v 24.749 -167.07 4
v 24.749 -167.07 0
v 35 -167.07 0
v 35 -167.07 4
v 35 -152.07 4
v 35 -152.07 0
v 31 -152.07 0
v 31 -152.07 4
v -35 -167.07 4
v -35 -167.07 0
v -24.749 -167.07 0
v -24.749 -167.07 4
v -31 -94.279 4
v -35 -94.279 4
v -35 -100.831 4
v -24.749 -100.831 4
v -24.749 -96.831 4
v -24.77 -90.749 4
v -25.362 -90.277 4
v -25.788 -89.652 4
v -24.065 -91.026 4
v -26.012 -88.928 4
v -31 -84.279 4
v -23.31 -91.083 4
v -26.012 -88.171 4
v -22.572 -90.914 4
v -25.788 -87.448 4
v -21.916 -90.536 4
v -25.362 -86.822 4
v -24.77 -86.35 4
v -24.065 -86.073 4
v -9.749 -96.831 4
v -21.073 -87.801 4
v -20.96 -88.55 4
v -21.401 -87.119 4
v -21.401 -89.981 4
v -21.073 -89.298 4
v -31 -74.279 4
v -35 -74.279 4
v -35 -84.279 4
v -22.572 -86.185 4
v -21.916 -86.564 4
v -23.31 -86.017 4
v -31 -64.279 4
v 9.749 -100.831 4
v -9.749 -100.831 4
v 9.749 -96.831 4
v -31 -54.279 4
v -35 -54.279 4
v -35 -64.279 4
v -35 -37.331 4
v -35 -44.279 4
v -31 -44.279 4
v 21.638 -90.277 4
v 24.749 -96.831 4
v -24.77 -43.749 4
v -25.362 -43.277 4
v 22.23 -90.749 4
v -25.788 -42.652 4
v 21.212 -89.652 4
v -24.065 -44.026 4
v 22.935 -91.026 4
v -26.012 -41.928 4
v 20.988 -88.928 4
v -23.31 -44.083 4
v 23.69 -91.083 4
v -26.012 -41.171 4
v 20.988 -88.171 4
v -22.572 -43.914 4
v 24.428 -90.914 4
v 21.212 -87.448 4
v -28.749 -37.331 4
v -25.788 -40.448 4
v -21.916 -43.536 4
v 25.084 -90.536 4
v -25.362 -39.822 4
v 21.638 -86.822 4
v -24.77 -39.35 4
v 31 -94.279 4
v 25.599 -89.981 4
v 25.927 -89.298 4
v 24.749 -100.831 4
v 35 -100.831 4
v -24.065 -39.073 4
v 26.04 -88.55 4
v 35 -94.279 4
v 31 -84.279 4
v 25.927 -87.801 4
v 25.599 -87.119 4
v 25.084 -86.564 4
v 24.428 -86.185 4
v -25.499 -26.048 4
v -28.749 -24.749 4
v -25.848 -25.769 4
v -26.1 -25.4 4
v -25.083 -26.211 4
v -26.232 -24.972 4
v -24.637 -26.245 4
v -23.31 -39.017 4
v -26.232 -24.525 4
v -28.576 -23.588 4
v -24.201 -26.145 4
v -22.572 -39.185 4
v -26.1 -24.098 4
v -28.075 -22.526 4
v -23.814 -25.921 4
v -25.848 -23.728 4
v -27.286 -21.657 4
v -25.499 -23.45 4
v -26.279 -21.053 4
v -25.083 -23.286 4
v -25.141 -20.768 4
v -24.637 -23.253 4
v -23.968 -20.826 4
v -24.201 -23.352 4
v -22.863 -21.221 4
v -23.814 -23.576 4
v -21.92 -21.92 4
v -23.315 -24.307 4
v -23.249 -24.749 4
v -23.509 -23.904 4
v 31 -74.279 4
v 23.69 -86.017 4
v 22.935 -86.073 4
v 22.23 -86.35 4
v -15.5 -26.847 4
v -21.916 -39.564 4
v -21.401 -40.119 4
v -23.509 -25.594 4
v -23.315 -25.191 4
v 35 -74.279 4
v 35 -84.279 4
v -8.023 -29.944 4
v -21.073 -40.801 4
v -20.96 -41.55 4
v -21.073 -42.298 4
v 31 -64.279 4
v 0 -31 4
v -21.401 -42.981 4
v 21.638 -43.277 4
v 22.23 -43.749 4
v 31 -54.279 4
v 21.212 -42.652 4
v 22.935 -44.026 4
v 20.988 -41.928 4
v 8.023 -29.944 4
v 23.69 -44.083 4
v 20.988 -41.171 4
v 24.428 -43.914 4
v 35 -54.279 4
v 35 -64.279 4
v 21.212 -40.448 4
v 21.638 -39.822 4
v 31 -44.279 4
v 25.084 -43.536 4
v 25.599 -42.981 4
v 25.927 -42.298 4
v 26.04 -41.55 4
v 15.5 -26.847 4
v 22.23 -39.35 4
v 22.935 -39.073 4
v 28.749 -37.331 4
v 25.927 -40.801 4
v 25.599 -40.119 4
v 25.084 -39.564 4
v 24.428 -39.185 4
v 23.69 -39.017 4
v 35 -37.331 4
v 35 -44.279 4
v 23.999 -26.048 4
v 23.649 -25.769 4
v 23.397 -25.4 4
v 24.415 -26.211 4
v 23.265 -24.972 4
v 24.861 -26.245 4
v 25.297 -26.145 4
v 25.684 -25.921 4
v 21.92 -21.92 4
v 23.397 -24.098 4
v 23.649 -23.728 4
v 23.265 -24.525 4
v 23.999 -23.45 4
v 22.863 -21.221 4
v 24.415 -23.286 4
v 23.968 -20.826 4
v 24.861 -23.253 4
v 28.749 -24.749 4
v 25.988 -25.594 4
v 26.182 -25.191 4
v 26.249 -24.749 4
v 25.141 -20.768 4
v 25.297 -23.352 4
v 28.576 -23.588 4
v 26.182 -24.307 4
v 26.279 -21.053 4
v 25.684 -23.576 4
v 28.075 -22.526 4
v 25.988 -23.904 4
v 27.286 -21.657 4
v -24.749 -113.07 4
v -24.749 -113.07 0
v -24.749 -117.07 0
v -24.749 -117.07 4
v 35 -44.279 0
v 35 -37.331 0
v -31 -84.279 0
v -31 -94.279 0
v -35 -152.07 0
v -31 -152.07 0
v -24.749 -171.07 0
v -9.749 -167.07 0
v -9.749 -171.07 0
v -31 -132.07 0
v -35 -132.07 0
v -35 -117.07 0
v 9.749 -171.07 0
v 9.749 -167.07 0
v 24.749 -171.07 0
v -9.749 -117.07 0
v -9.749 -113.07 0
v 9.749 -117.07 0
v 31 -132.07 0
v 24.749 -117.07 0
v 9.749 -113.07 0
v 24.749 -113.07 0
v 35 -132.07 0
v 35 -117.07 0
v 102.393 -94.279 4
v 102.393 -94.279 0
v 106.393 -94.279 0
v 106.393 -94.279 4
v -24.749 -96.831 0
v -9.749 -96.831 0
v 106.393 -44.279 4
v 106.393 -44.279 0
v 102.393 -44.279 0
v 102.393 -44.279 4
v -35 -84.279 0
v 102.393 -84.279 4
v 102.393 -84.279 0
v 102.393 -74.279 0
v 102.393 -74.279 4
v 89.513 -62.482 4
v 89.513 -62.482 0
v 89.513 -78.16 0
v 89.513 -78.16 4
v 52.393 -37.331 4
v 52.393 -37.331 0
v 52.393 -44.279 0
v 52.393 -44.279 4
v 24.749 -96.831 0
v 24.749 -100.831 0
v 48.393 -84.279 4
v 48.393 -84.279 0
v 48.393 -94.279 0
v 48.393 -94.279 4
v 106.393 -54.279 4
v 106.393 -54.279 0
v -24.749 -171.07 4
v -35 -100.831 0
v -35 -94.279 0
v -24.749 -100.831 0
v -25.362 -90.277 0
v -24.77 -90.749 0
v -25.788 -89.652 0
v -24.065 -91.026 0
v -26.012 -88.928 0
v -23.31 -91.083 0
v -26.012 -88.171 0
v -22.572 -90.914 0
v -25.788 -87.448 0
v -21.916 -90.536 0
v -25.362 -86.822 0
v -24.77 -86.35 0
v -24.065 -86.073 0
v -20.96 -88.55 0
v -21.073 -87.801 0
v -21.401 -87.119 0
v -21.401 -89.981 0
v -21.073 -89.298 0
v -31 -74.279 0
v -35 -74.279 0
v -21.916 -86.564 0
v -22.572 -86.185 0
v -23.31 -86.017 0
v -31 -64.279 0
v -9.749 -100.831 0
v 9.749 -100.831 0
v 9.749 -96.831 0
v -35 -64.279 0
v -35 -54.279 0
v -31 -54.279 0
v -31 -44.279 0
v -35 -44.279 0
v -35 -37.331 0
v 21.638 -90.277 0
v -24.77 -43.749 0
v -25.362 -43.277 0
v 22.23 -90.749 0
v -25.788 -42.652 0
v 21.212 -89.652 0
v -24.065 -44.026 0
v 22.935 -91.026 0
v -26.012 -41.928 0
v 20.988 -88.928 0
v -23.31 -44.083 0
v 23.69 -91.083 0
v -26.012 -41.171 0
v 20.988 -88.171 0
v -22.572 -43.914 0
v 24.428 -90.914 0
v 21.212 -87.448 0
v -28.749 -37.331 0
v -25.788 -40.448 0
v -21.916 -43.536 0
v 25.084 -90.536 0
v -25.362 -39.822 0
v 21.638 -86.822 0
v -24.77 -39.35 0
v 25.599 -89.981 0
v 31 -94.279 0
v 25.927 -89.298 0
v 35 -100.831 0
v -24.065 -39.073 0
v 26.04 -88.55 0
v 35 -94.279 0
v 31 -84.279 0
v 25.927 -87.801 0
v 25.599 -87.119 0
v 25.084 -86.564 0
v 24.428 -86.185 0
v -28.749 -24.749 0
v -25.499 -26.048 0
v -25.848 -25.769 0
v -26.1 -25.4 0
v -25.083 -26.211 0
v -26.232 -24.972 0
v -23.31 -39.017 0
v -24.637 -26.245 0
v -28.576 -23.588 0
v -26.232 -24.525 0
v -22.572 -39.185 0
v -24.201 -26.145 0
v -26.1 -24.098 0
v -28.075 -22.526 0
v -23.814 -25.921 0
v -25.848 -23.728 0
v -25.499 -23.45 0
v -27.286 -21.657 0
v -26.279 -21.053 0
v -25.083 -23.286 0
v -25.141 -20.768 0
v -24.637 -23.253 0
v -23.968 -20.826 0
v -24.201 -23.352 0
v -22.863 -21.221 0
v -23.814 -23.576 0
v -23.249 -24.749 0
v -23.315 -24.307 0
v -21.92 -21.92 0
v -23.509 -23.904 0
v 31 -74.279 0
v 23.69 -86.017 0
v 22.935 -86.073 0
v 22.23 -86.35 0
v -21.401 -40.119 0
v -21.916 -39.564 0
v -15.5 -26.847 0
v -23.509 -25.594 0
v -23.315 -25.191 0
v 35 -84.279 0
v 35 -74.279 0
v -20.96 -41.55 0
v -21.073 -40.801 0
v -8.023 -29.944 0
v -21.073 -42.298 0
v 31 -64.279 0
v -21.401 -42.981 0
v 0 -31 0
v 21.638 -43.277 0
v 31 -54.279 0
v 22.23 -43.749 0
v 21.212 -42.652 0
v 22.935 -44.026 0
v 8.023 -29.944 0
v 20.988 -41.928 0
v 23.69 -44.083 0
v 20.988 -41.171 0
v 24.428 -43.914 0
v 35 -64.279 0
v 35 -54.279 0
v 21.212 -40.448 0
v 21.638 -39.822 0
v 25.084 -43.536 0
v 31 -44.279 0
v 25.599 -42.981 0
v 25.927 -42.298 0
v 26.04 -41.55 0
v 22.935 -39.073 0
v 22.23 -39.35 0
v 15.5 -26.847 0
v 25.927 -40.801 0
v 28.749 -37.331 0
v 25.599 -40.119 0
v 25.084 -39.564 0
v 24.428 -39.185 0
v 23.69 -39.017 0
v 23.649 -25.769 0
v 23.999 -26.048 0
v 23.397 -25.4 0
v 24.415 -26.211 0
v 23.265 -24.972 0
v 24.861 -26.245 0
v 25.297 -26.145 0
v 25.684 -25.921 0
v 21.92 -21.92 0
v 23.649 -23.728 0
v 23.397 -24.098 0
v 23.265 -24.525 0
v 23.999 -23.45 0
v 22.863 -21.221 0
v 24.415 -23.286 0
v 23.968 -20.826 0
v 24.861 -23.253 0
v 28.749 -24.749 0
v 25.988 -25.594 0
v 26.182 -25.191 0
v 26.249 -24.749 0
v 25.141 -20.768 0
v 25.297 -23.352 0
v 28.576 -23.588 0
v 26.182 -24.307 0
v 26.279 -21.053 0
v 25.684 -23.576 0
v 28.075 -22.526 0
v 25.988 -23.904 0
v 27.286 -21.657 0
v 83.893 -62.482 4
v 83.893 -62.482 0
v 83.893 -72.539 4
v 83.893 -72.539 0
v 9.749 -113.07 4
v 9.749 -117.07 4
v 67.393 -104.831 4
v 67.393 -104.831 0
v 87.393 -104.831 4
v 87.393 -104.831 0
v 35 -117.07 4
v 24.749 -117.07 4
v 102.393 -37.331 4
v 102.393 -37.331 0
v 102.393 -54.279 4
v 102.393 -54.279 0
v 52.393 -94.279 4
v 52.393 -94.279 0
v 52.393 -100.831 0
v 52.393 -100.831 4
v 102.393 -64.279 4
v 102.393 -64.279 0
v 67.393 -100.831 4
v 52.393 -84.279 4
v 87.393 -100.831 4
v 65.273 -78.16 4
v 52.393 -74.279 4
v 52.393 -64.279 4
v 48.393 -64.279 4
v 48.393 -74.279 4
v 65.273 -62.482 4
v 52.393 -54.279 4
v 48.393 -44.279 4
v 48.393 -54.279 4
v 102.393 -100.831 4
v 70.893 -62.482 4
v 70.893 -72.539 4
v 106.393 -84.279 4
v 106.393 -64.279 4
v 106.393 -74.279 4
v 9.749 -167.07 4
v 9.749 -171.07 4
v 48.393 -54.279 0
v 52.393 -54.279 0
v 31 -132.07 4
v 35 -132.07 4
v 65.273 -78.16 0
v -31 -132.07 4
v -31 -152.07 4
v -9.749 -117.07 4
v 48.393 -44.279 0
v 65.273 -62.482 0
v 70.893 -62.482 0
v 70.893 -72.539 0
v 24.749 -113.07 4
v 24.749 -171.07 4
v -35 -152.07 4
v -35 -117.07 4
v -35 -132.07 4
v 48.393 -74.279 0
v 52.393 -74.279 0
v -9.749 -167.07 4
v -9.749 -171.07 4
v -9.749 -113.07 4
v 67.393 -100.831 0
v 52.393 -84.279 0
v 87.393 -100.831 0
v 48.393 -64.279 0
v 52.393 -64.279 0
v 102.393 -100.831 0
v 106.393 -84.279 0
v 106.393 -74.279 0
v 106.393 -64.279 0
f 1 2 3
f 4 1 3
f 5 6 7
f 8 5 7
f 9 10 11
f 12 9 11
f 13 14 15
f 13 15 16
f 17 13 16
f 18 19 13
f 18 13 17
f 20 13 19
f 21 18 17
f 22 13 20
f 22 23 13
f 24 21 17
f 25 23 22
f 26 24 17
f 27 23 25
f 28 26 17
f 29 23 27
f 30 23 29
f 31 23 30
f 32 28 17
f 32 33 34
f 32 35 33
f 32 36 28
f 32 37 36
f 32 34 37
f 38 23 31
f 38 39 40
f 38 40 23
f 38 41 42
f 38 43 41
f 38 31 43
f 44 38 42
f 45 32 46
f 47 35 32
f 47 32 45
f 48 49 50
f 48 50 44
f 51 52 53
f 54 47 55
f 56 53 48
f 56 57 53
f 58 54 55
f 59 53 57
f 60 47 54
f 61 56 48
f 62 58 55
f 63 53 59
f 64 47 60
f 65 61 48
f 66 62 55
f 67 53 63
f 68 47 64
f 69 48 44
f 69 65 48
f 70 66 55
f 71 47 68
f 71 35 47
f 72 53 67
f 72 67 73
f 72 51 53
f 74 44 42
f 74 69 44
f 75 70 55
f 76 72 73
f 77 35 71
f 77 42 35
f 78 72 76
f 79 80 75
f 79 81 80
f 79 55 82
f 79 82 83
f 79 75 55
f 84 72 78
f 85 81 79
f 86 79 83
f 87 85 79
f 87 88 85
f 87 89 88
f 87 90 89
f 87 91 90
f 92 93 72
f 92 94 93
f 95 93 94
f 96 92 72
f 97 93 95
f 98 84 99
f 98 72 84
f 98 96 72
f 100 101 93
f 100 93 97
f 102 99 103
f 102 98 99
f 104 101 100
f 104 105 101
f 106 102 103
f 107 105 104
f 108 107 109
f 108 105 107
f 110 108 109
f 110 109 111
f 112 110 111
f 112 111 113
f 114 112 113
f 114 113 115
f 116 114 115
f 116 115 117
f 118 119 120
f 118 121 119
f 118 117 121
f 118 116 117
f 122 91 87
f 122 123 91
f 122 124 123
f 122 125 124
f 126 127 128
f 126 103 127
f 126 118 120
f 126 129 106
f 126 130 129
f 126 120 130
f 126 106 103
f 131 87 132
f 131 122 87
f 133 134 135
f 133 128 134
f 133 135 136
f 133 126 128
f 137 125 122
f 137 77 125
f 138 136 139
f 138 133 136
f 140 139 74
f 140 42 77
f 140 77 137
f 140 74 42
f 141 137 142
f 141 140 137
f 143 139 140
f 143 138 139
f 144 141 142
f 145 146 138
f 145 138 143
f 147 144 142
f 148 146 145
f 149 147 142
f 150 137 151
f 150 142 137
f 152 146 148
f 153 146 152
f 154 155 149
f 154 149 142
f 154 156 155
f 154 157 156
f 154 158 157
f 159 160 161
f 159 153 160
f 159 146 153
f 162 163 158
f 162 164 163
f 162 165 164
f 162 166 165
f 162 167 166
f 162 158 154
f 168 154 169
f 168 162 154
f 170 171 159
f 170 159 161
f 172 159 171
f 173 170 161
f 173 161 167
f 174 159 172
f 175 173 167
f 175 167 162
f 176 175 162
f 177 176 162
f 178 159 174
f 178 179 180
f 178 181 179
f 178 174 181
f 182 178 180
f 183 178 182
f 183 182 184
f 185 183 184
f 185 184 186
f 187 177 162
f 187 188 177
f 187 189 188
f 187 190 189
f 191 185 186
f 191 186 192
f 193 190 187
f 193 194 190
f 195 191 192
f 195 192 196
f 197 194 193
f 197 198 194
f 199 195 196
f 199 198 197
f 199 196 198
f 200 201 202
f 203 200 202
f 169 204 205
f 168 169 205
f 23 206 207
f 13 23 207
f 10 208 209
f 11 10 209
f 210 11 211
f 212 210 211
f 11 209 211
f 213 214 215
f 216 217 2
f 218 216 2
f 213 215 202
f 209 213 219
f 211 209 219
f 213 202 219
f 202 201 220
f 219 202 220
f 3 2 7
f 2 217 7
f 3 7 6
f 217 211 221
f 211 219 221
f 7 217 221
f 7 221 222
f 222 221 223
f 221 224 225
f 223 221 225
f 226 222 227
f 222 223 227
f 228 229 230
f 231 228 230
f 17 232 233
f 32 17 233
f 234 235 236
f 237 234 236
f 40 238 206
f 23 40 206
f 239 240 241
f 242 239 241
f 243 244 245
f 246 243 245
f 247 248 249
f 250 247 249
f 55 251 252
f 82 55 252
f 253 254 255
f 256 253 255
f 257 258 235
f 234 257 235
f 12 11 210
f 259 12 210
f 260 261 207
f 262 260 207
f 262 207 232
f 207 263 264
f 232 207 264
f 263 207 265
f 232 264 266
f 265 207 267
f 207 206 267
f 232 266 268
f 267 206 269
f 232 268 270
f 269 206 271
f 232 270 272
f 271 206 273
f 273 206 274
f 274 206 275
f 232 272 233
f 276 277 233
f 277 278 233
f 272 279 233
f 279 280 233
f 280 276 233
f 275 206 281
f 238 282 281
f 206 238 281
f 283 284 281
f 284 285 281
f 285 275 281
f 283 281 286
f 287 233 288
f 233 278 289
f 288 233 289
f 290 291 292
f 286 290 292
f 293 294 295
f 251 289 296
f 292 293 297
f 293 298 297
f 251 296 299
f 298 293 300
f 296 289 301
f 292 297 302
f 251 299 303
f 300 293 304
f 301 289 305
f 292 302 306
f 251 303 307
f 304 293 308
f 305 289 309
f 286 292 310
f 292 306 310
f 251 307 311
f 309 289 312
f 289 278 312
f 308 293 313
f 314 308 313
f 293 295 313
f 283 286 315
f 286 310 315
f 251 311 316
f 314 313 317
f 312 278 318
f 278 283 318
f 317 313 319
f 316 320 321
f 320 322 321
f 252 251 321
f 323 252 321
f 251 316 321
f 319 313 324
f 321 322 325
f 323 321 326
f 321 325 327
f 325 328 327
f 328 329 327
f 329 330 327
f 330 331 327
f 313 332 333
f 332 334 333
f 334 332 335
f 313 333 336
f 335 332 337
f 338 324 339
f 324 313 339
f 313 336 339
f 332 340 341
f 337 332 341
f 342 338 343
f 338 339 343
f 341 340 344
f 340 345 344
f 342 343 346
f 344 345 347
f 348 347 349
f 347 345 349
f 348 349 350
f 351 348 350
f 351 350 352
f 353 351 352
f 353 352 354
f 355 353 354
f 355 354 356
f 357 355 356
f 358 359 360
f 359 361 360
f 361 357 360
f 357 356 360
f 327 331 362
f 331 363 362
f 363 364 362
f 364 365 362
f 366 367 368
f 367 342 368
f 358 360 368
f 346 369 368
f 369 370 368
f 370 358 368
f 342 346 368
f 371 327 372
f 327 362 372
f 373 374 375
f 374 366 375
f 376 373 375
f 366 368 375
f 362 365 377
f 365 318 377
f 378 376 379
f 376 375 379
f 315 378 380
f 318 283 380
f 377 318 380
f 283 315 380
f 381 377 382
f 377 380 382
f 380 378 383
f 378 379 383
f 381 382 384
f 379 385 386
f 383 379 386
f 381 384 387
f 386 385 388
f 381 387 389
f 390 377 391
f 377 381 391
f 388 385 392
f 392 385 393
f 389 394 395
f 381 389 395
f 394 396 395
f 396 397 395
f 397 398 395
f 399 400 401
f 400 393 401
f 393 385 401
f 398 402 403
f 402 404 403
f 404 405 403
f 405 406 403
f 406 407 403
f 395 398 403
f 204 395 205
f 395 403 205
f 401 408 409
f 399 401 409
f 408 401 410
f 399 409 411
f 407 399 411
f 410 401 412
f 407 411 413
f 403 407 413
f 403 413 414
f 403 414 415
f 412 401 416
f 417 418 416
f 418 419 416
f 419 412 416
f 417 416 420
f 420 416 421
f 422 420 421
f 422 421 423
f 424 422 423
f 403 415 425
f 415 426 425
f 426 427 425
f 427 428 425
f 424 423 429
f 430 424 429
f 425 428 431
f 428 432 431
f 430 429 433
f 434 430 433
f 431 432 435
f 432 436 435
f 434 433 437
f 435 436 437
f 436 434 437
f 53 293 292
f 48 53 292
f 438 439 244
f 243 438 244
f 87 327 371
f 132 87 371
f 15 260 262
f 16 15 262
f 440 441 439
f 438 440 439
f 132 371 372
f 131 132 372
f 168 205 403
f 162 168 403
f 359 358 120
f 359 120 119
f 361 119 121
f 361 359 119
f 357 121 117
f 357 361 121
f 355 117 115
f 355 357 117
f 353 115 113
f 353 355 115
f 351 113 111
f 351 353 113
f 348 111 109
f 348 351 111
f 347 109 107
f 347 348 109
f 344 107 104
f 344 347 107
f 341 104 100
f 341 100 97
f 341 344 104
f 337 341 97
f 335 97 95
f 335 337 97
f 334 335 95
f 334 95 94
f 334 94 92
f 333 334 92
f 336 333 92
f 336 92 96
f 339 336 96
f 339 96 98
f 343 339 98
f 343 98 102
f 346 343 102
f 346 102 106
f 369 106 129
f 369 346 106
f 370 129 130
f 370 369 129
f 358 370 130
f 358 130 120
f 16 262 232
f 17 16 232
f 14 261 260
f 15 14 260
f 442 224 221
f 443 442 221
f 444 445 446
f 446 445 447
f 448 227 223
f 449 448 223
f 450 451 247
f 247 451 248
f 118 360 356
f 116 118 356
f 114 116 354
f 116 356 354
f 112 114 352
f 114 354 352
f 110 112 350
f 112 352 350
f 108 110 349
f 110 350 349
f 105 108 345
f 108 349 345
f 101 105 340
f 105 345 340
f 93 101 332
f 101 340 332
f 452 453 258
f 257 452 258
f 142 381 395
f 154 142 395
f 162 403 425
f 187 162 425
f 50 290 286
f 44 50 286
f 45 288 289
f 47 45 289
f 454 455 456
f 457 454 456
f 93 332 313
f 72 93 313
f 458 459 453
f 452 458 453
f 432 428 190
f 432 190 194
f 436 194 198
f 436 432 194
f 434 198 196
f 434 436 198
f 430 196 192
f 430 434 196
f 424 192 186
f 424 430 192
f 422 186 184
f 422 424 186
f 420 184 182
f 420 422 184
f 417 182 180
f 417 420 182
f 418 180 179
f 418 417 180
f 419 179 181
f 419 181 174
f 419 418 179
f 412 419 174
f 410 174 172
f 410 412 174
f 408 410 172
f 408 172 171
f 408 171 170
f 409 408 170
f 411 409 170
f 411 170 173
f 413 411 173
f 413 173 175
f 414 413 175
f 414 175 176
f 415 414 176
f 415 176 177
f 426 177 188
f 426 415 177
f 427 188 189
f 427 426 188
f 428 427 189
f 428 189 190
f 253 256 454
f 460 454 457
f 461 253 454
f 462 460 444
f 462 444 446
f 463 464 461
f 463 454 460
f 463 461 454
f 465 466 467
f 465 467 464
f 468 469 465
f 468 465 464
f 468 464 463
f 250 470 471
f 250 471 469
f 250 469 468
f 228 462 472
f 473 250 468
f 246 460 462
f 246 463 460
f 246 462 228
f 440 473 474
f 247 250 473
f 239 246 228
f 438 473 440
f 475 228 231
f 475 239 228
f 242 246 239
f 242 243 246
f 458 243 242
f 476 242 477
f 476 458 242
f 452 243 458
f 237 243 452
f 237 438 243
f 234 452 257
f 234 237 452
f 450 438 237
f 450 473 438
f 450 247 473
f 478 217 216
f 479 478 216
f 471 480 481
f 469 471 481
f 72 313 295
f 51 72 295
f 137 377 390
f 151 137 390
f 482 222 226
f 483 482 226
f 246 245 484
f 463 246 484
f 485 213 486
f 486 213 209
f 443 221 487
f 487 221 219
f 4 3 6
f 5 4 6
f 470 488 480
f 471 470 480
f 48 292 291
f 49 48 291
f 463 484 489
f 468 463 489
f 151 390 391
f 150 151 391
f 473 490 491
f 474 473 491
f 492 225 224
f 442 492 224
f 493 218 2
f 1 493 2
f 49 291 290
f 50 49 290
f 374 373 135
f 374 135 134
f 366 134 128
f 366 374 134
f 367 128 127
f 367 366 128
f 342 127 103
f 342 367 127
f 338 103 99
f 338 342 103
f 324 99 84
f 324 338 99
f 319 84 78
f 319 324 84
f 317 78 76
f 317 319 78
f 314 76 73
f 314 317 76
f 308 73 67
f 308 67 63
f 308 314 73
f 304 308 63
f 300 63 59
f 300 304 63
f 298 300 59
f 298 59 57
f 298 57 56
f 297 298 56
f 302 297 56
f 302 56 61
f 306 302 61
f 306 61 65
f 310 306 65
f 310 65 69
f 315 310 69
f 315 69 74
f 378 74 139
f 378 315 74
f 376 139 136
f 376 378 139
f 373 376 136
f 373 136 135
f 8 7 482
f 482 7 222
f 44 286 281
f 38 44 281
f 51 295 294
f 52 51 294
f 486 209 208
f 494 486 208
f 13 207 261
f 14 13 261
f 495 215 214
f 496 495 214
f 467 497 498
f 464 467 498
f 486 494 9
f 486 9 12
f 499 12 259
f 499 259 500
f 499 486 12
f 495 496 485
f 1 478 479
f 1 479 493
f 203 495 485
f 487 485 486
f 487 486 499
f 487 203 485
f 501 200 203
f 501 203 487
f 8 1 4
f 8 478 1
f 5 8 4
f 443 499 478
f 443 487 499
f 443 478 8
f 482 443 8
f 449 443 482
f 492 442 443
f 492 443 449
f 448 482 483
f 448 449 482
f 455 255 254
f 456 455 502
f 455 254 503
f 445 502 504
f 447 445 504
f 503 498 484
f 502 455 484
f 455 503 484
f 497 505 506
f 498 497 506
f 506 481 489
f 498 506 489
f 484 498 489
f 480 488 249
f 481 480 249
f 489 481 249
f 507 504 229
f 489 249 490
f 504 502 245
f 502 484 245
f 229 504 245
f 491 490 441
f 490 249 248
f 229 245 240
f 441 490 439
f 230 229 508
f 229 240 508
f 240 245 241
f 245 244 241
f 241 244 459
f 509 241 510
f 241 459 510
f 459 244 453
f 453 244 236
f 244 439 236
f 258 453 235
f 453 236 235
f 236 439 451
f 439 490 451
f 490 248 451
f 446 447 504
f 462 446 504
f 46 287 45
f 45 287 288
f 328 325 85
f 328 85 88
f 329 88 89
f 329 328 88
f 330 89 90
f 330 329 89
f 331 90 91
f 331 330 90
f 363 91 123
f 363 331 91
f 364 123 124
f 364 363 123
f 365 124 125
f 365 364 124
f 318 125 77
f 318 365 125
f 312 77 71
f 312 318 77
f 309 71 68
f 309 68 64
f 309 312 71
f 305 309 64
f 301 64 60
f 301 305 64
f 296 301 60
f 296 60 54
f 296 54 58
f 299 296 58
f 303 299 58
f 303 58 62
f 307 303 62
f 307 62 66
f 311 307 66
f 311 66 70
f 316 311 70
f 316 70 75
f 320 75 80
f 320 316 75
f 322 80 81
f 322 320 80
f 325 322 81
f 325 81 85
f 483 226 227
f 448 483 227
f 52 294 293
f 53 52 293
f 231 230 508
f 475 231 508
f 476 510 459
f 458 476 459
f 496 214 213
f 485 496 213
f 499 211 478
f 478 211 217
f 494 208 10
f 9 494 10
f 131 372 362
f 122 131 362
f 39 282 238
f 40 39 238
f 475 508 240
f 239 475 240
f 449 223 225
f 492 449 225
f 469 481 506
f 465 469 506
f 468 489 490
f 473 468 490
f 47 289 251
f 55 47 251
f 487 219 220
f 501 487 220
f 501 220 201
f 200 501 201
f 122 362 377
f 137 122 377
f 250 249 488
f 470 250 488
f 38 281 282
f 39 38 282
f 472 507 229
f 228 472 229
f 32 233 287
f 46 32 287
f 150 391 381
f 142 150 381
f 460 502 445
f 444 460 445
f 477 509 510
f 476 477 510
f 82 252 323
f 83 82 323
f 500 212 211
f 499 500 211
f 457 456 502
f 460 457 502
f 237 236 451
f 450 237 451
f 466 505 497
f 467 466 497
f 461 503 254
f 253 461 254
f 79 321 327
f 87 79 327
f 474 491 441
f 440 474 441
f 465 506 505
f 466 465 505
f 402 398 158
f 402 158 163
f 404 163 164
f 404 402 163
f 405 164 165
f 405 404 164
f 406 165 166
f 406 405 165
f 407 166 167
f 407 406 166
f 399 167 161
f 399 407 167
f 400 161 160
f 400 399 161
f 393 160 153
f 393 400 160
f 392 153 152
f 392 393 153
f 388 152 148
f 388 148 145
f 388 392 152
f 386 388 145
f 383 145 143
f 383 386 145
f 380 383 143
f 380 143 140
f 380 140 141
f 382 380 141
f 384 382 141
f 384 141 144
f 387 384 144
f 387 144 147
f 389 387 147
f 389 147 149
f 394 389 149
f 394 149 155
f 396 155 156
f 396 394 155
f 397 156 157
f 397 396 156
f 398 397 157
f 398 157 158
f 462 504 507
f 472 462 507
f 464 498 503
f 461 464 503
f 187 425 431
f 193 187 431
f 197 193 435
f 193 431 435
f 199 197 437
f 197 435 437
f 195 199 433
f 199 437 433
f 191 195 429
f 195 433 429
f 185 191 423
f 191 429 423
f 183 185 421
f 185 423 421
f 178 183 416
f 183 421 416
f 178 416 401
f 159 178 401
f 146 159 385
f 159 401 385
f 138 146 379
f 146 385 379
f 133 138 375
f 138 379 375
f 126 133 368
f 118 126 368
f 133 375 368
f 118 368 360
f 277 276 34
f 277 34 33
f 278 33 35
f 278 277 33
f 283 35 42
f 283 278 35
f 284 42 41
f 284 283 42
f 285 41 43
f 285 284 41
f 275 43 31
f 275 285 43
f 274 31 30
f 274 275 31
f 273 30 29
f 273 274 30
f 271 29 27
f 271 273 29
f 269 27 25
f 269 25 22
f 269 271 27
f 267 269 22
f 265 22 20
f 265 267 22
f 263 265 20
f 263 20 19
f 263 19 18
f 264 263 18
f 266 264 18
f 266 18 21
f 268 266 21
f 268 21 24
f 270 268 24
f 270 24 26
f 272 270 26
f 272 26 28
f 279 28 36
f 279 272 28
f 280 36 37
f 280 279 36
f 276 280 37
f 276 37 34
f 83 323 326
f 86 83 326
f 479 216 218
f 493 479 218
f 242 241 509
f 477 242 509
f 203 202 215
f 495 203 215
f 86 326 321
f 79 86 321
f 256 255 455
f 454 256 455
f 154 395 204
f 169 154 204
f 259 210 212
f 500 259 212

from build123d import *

# Parameters (mm, degrees)
SKETCH1_R             = 2.54
SKETCH1_R_2           = 1.5
BOSS_EXTRUDE1_DEPTH   = 4
BOSS_EXTRUDE1_2_DEPTH = 4
BOSS_EXTRUDE1_3_DEPTH = 4


with BuildPart() as part:
    # Sketch1 → Boss-Extrude1 (new body)
    with BuildSketch(Plane.XY):
        with BuildLine():
            Line((-35, -94.278824944), (-35, -100.830704015))
            Line((-35, -100.830704015), (-24.748737342, -100.830704015))
            Line((-24.748737342, -100.830704015), (-24.748737342, -96.830704015))
            Line((-24.748737342, -96.830704015), (-9.748737342, -96.830704015))
            Line((-9.748737342, -96.830704015), (-9.748737342, -100.830704015))
            Line((-9.748737342, -100.830704015), (9.748737342, -100.830704015))
            Line((9.748737342, -100.830704015), (9.748737342, -96.830704015))
            Line((9.748737342, -96.830704015), (24.748737342, -96.830704015))
            Line((24.748737342, -96.830704015), (24.748737342, -100.830704015))
            Line((24.748737342, -100.830704015), (35, -100.830704015))
            Line((35, -100.830704015), (35, -94.278824944))
            Line((35, -94.278824944), (31, -94.278824944))
            Line((31, -94.278824944), (31, -84.278824944))
            Line((31, -84.278824944), (35, -84.278824944))
            Line((35, -84.278824944), (35, -74.278824944))
            Line((35, -74.278824944), (31, -74.278824944))
            Line((31, -74.278824944), (31, -64.278824944))
            Line((31, -64.278824944), (35, -64.278824944))
            Line((35, -64.278824944), (35, -54.278824944))
            Line((35, -54.278824944), (31, -54.278824944))
            Line((31, -54.278824944), (31, -44.278824944))
            Line((31, -44.278824944), (35, -44.278824944))
            Line((35, -44.278824944), (35, -37.330704015))
            Line((35, -37.330704015), (28.748737342, -37.330704015))
            Line((28.748737342, -37.330704015), (28.748737342, -24.748737342))
            ThreePointArc((28.748737342, -24.748737342), (26.279471071, -21.053219211), (21.920310217, -21.920310217))
            ThreePointArc((21.920310217, -21.920310217), (0, -31), (-21.920310217, -21.920310217))
            ThreePointArc((-21.920310217, -21.920310217), (-26.279471071, -21.053219211), (-28.748737342, -24.748737342))
            Line((-28.748737342, -24.748737342), (-28.748737342, -37.330704015))
            Line((-28.748737342, -37.330704015), (-35, -37.330704015))
            Line((-35, -37.330704015), (-35, -44.278824944))
            Line((-35, -44.278824944), (-31, -44.278824944))
            Line((-31, -44.278824944), (-31, -54.278824944))
            Line((-31, -54.278824944), (-35, -54.278824944))
            Line((-35, -54.278824944), (-35, -64.278824944))
            Line((-35, -64.278824944), (-31, -64.278824944))
            Line((-31, -64.278824944), (-31, -74.278824944))
            Line((-31, -74.278824944), (-35, -74.278824944))
            Line((-35, -74.278824944), (-35, -84.278824944))
            Line((-35, -84.278824944), (-31, -84.278824944))
            Line((-31, -84.278824944), (-31, -94.278824944))
            Line((-31, -94.278824944), (-35, -94.278824944))
        make_face()
        with Locations((-23.5, -88.549683874)):
            Circle(SKETCH1_R, mode=Mode.SUBTRACT)
        with Locations((23.5, -88.549683874)):
            Circle(SKETCH1_R, mode=Mode.SUBTRACT)
        with Locations((-23.5, -41.549683874)):
            Circle(SKETCH1_R, mode=Mode.SUBTRACT)
        with Locations((-24.748737342, -24.748737342)):
            Circle(SKETCH1_R_2, mode=Mode.SUBTRACT)
        with Locations((23.5, -41.549683874)):
            Circle(SKETCH1_R, mode=Mode.SUBTRACT)
        with Locations((24.748737342, -24.748737342)):
            Circle(SKETCH1_R_2, mode=Mode.SUBTRACT)
    extrude(amount=BOSS_EXTRUDE1_DEPTH)


with BuildPart() as body_2:
    # Sketch1 → Boss-Extrude1 2 (new body)
    with BuildSketch(Plane.XY):
        Polygon((87.392932462, -104.830704015), (87.392932462, -100.830704015), (102.392932462, -100.830704015), (102.392932462, -94.278824944), (106.392932462, -94.278824944), (106.392932462, -84.278824944), (102.392932462, -84.278824944), (102.392932462, -74.278824944), (106.392932462, -74.278824944), (106.392932462, -64.278824944), (102.392932462, -64.278824944), (102.392932462, -54.278824944), (106.392932462, -54.278824944), (106.392932462, -44.278824944), (102.392932462, -44.278824944), (102.392932462, -37.330704015), (52.392932462, -37.330704015), (52.392932462, -44.278824944), (48.392932462, -44.278824944), (48.392932462, -54.278824944), (52.392932462, -54.278824944), (52.392932462, -64.278824944), (48.392932462, -64.278824944), (48.392932462, -74.278824944), (52.392932462, -74.278824944), (52.392932462, -84.278824944), (48.392932462, -84.278824944), (48.392932462, -94.278824944), (52.392932462, -94.278824944), (52.392932462, -100.830704015), (67.392932462, -100.830704015), (67.392932462, -104.830704015), align=None)
        Polygon((65.27265077, -78.159810059), (65.27265077, -62.481717659), (70.893098989, -62.481717659), (70.893098989, -72.53936184), (83.892765935, -72.53936184), (83.892765935, -62.481717659), (89.513214154, -62.481717659), (89.513214154, -78.159810059), align=None, mode=Mode.SUBTRACT)
    extrude(amount=BOSS_EXTRUDE1_2_DEPTH)


with BuildPart() as body_3:
    # Sketch1 → Boss-Extrude1 3 (new body)
    with BuildSketch(Plane.XY):
        Polygon((35, -117.070270322), (24.748737342, -117.070270322), (24.748737342, -113.070270322), (9.748737342, -113.070270322), (9.748737342, -117.070270322), (-9.748737342, -117.070270322), (-9.748737342, -113.070270322), (-24.748737342, -113.070270322), (-24.748737342, -117.070270322), (-35, -117.070270322), (-35, -132.070270322), (-31, -132.070270322), (-31, -152.070270322), (-35, -152.070270322), (-35, -167.070270322), (-24.748737342, -167.070270322), (-24.748737342, -171.070270322), (-9.748737342, -171.070270322), (-9.748737342, -167.070270322), (9.748737342, -167.070270322), (9.748737342, -171.070270322), (24.748737342, -171.070270322), (24.748737342, -167.070270322), (35, -167.070270322), (35, -152.070270322), (31, -152.070270322), (31, -132.070270322), (35, -132.070270322), align=None)
    extrude(amount=BOSS_EXTRUDE1_3_DEPTH)


solid = Compound([part.part, body_2.part, body_3.part])
